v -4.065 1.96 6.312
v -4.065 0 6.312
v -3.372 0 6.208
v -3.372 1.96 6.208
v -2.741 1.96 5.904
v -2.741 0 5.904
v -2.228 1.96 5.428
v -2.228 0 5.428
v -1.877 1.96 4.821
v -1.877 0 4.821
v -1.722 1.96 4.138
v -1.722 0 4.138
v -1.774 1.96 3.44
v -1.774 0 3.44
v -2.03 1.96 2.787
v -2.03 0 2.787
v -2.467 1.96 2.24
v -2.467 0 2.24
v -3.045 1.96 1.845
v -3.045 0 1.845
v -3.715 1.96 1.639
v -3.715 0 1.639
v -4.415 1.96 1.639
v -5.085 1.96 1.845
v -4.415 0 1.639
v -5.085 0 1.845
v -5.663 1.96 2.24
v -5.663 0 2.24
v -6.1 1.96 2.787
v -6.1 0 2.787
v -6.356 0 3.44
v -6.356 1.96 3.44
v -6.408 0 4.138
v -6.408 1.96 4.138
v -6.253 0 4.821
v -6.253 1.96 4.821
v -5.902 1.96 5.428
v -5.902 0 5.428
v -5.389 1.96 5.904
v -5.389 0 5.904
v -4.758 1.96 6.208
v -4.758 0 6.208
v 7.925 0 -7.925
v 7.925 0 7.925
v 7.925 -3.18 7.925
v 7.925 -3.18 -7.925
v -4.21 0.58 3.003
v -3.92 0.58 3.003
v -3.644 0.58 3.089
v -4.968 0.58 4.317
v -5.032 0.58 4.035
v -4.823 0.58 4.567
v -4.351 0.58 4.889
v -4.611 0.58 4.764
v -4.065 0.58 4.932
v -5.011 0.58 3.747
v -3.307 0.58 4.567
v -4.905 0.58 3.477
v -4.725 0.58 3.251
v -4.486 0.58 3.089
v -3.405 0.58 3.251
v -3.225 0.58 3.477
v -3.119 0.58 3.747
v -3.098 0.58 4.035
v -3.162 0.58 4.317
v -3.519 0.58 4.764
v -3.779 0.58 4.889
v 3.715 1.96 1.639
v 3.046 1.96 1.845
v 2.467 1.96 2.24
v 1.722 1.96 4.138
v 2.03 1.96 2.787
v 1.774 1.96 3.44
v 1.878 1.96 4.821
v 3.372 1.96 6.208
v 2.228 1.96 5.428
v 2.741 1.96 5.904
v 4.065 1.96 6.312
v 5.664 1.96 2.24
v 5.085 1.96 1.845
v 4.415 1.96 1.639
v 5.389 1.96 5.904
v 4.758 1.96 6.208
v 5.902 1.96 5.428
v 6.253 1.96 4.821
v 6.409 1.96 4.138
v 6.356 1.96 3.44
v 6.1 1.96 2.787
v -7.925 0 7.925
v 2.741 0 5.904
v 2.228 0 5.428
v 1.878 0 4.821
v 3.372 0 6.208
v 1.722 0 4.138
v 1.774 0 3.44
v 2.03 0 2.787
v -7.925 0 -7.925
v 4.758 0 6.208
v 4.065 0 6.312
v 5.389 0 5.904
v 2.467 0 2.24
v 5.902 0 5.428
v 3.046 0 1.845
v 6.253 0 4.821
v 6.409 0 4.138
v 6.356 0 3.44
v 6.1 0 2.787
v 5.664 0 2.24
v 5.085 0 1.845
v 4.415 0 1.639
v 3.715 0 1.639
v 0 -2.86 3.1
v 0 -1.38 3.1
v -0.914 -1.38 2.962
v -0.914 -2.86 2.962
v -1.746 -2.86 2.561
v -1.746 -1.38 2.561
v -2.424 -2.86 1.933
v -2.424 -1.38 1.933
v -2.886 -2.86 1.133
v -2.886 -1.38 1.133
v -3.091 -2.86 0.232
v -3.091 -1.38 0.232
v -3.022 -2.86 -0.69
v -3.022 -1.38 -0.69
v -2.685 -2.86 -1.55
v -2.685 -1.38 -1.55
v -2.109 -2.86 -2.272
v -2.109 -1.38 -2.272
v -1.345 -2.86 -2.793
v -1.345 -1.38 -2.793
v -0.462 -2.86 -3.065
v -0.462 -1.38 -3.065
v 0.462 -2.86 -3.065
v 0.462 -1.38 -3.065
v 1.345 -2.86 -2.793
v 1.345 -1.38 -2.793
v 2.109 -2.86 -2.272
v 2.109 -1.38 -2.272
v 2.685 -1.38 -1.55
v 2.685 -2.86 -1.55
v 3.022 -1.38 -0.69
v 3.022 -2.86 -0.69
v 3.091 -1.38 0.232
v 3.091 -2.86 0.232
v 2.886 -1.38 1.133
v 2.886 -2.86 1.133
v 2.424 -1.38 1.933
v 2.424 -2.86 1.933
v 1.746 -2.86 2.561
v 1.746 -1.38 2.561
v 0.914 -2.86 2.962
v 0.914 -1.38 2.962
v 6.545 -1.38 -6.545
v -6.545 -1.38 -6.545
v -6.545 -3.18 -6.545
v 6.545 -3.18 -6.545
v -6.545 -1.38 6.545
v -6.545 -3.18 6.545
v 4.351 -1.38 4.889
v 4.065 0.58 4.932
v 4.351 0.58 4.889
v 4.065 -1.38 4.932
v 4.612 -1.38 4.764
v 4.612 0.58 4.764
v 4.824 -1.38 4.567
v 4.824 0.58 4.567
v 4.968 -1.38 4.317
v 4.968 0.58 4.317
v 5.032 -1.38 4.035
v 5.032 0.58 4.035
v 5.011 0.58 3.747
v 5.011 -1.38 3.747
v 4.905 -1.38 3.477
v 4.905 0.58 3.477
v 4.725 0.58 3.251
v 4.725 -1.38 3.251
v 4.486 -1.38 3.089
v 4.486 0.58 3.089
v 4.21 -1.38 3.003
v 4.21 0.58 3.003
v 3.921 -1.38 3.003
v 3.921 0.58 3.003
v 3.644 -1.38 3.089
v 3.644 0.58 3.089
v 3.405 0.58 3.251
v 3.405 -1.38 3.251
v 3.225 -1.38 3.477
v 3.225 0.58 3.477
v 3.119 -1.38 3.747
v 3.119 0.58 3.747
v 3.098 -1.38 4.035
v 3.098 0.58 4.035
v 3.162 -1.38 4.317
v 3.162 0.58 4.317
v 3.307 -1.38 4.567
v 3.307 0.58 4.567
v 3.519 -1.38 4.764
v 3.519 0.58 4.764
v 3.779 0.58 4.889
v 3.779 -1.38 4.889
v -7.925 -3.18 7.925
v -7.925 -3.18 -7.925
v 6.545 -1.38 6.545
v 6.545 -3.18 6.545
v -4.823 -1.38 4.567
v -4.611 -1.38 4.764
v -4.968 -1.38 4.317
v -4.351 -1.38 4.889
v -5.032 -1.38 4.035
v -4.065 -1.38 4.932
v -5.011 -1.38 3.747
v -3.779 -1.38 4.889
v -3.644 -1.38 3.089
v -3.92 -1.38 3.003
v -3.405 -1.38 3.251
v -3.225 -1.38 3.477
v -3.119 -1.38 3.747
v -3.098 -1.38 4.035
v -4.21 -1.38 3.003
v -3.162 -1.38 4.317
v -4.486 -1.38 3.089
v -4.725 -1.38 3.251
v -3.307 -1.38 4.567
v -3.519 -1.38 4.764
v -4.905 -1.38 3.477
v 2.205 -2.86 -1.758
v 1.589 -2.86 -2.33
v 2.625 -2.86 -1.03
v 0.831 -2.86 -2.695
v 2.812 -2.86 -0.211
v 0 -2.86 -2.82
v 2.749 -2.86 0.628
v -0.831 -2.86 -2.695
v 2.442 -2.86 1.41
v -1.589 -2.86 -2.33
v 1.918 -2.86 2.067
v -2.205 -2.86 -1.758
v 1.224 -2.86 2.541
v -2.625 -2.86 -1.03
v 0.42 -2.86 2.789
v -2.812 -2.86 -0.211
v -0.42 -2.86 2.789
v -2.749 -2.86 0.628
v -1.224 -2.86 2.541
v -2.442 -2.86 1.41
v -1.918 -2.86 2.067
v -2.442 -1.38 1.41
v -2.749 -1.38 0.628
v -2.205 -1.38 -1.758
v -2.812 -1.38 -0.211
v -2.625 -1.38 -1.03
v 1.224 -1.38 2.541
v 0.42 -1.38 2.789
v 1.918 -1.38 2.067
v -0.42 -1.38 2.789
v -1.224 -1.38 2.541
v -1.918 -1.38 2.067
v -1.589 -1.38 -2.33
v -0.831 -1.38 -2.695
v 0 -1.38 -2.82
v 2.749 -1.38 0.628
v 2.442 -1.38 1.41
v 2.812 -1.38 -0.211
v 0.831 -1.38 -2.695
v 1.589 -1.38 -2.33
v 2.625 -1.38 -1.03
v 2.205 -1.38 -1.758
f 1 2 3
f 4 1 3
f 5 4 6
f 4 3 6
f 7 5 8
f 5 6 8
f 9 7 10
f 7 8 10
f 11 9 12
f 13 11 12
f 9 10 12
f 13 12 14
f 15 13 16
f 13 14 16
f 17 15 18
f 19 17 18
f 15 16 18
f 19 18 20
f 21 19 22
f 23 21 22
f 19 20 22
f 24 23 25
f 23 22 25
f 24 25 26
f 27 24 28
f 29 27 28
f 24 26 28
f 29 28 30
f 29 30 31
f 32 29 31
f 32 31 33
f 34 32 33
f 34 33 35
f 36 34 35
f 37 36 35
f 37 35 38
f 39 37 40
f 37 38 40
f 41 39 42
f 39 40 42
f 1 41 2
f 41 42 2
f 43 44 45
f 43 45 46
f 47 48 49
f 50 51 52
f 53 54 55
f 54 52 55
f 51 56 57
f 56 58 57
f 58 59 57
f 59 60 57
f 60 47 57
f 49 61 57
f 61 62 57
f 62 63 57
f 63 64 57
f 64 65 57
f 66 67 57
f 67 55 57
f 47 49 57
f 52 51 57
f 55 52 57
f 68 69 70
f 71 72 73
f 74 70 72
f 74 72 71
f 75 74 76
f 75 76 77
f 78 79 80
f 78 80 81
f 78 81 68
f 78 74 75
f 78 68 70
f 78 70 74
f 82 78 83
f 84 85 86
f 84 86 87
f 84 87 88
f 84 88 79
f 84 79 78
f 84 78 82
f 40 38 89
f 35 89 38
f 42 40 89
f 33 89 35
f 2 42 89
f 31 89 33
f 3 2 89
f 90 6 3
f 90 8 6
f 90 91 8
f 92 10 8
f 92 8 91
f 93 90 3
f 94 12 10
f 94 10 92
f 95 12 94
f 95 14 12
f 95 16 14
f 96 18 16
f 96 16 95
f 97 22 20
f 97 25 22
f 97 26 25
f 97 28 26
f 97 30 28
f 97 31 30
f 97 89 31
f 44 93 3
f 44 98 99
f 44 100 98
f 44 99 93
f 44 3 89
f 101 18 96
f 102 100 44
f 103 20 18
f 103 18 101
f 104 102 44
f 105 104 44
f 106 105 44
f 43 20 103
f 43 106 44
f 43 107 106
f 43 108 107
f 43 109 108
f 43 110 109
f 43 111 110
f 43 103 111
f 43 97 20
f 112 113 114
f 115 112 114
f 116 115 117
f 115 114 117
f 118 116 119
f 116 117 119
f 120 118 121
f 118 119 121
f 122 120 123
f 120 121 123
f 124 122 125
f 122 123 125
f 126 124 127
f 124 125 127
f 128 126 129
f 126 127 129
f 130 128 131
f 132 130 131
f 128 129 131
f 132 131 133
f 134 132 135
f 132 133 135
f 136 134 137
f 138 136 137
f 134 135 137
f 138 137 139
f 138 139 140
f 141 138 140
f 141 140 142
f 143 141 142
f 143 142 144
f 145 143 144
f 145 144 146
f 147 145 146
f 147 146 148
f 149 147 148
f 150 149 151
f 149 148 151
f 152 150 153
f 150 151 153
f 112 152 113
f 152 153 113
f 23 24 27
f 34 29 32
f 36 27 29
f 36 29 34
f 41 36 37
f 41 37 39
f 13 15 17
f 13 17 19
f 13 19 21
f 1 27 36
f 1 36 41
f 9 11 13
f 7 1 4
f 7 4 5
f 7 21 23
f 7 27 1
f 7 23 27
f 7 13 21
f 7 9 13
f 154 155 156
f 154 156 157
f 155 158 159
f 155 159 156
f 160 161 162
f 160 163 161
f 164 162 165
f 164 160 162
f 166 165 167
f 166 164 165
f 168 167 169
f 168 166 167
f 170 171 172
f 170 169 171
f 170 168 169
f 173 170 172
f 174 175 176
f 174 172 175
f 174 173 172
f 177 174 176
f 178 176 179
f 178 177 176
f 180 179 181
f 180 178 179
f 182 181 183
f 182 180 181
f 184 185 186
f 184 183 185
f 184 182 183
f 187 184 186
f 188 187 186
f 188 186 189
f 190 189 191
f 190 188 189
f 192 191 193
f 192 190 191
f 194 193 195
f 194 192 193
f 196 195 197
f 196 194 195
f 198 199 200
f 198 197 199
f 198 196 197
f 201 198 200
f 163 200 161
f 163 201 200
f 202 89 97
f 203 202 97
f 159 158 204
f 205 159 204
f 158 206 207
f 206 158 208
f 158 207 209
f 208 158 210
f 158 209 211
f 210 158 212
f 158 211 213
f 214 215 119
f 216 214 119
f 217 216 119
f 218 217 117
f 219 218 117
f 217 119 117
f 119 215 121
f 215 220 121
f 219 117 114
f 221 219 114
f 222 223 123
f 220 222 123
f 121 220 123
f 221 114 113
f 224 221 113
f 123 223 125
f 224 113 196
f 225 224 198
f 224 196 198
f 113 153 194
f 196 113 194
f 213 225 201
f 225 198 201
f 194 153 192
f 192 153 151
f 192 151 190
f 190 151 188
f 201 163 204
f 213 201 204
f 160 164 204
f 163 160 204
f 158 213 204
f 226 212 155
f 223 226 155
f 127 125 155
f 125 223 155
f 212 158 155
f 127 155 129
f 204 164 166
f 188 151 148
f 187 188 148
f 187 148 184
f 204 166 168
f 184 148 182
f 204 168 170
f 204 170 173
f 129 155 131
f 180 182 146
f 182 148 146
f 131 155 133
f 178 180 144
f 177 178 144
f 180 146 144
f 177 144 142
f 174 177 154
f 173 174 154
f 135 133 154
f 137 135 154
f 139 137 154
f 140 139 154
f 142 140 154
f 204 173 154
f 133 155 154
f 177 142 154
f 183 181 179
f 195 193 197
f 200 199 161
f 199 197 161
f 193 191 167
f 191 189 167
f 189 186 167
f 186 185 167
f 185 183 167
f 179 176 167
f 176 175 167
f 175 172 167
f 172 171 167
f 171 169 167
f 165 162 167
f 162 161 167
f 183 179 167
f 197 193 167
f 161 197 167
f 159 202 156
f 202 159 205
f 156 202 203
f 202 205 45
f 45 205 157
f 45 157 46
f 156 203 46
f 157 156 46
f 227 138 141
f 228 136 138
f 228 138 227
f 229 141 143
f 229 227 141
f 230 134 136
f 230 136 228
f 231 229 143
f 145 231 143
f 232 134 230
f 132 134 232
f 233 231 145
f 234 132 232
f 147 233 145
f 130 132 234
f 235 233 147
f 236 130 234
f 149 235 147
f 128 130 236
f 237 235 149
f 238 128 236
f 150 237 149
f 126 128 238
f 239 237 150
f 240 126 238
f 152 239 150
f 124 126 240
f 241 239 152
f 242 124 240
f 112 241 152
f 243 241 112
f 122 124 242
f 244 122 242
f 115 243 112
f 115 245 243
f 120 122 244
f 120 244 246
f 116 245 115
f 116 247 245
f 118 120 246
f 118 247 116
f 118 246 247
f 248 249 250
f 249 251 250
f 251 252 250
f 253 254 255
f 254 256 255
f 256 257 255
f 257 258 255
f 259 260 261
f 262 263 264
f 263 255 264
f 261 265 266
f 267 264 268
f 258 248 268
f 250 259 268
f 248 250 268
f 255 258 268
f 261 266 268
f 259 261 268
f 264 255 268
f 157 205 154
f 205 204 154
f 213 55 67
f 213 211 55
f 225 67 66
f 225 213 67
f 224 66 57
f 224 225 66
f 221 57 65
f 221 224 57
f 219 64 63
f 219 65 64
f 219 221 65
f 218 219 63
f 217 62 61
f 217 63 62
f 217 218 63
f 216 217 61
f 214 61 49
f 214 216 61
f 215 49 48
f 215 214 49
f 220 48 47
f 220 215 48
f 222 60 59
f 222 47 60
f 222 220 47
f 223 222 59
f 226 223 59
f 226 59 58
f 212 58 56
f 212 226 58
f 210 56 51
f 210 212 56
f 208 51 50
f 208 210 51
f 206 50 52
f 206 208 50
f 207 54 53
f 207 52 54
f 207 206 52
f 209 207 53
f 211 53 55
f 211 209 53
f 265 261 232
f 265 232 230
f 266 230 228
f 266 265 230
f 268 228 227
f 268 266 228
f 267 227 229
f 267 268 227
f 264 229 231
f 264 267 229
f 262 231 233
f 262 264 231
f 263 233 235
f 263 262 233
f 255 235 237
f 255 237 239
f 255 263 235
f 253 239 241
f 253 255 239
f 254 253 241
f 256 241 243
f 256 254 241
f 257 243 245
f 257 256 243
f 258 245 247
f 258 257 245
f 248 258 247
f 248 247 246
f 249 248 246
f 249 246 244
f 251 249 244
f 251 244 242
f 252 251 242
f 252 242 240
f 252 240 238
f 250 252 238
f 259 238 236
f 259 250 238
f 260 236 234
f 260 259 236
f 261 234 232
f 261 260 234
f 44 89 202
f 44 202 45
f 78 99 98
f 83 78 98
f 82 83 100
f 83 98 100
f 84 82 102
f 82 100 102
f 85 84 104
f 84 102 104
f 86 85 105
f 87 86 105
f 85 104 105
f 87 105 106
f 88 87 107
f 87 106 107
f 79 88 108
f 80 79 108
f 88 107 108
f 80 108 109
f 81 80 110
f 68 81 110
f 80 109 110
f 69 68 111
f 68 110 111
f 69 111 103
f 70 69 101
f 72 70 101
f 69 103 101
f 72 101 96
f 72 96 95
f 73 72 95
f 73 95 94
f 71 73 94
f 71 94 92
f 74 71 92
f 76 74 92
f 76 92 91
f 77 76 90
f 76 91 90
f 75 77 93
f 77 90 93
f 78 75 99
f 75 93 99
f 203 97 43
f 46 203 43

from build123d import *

# Parameters (mm, degrees)
SKETCH1_W           = 15.85
SKETCH1_H           = 15.85
BOSS_EXTRUDE1_DEPTH = 3.18
SKETCH2_R           = 2.35
BOSS_EXTRUDE2_DEPTH = 1.96
SHELL1_T            = -1.38
SKETCH3_R           = 3.1
SKETCH3_R_2         = 2.82
BOSS_EXTRUDE3_DEPTH = 1.48


with BuildPart() as part:
    # Sketch1 → Boss-Extrude1 (new body)
    with BuildSketch(Plane(origin=(0, 0, 0), x_dir=(1, 0, 0), z_dir=(0, 1, 0))):
        Rectangle(SKETCH1_W, SKETCH1_H)
    extrude(amount=-BOSS_EXTRUDE1_DEPTH)

    # Sketch2 → Boss-Extrude2 (add)
    with BuildSketch(Plane(origin=(0, 0, 0), x_dir=(1, 0, 0), z_dir=(0, 1, 0))):
        with Locations(Location((-4.065, -3.9625, 0), (0, 0, 270))):
            Circle(SKETCH2_R)
        with Locations(Location((4.065166585, -3.9625, 0), (0, 0, 270))):
            Circle(SKETCH2_R)
    extrude(amount=BOSS_EXTRUDE2_DEPTH)

    # Shell1
    shell1_openings = [part.faces().sort_by_distance(p)[0] for p in [
        (0, -3.18, 0),
    ]]
    offset(amount=SHELL1_T, openings=shell1_openings, kind=Kind.INTERSECTION)

    # Sketch3 → Boss-Extrude3 (add)
    with BuildSketch(Plane.XZ.offset(1.38)):
        with Locations(Location((0, 0, 0), (0, 0, 90))):
            Circle(SKETCH3_R)
        with Locations(Location((0, 0, 0), (0, 0, 270))):
            Circle(SKETCH3_R_2, mode=Mode.SUBTRACT)
    extrude(amount=BOSS_EXTRUDE3_DEPTH)


solid = part.part
